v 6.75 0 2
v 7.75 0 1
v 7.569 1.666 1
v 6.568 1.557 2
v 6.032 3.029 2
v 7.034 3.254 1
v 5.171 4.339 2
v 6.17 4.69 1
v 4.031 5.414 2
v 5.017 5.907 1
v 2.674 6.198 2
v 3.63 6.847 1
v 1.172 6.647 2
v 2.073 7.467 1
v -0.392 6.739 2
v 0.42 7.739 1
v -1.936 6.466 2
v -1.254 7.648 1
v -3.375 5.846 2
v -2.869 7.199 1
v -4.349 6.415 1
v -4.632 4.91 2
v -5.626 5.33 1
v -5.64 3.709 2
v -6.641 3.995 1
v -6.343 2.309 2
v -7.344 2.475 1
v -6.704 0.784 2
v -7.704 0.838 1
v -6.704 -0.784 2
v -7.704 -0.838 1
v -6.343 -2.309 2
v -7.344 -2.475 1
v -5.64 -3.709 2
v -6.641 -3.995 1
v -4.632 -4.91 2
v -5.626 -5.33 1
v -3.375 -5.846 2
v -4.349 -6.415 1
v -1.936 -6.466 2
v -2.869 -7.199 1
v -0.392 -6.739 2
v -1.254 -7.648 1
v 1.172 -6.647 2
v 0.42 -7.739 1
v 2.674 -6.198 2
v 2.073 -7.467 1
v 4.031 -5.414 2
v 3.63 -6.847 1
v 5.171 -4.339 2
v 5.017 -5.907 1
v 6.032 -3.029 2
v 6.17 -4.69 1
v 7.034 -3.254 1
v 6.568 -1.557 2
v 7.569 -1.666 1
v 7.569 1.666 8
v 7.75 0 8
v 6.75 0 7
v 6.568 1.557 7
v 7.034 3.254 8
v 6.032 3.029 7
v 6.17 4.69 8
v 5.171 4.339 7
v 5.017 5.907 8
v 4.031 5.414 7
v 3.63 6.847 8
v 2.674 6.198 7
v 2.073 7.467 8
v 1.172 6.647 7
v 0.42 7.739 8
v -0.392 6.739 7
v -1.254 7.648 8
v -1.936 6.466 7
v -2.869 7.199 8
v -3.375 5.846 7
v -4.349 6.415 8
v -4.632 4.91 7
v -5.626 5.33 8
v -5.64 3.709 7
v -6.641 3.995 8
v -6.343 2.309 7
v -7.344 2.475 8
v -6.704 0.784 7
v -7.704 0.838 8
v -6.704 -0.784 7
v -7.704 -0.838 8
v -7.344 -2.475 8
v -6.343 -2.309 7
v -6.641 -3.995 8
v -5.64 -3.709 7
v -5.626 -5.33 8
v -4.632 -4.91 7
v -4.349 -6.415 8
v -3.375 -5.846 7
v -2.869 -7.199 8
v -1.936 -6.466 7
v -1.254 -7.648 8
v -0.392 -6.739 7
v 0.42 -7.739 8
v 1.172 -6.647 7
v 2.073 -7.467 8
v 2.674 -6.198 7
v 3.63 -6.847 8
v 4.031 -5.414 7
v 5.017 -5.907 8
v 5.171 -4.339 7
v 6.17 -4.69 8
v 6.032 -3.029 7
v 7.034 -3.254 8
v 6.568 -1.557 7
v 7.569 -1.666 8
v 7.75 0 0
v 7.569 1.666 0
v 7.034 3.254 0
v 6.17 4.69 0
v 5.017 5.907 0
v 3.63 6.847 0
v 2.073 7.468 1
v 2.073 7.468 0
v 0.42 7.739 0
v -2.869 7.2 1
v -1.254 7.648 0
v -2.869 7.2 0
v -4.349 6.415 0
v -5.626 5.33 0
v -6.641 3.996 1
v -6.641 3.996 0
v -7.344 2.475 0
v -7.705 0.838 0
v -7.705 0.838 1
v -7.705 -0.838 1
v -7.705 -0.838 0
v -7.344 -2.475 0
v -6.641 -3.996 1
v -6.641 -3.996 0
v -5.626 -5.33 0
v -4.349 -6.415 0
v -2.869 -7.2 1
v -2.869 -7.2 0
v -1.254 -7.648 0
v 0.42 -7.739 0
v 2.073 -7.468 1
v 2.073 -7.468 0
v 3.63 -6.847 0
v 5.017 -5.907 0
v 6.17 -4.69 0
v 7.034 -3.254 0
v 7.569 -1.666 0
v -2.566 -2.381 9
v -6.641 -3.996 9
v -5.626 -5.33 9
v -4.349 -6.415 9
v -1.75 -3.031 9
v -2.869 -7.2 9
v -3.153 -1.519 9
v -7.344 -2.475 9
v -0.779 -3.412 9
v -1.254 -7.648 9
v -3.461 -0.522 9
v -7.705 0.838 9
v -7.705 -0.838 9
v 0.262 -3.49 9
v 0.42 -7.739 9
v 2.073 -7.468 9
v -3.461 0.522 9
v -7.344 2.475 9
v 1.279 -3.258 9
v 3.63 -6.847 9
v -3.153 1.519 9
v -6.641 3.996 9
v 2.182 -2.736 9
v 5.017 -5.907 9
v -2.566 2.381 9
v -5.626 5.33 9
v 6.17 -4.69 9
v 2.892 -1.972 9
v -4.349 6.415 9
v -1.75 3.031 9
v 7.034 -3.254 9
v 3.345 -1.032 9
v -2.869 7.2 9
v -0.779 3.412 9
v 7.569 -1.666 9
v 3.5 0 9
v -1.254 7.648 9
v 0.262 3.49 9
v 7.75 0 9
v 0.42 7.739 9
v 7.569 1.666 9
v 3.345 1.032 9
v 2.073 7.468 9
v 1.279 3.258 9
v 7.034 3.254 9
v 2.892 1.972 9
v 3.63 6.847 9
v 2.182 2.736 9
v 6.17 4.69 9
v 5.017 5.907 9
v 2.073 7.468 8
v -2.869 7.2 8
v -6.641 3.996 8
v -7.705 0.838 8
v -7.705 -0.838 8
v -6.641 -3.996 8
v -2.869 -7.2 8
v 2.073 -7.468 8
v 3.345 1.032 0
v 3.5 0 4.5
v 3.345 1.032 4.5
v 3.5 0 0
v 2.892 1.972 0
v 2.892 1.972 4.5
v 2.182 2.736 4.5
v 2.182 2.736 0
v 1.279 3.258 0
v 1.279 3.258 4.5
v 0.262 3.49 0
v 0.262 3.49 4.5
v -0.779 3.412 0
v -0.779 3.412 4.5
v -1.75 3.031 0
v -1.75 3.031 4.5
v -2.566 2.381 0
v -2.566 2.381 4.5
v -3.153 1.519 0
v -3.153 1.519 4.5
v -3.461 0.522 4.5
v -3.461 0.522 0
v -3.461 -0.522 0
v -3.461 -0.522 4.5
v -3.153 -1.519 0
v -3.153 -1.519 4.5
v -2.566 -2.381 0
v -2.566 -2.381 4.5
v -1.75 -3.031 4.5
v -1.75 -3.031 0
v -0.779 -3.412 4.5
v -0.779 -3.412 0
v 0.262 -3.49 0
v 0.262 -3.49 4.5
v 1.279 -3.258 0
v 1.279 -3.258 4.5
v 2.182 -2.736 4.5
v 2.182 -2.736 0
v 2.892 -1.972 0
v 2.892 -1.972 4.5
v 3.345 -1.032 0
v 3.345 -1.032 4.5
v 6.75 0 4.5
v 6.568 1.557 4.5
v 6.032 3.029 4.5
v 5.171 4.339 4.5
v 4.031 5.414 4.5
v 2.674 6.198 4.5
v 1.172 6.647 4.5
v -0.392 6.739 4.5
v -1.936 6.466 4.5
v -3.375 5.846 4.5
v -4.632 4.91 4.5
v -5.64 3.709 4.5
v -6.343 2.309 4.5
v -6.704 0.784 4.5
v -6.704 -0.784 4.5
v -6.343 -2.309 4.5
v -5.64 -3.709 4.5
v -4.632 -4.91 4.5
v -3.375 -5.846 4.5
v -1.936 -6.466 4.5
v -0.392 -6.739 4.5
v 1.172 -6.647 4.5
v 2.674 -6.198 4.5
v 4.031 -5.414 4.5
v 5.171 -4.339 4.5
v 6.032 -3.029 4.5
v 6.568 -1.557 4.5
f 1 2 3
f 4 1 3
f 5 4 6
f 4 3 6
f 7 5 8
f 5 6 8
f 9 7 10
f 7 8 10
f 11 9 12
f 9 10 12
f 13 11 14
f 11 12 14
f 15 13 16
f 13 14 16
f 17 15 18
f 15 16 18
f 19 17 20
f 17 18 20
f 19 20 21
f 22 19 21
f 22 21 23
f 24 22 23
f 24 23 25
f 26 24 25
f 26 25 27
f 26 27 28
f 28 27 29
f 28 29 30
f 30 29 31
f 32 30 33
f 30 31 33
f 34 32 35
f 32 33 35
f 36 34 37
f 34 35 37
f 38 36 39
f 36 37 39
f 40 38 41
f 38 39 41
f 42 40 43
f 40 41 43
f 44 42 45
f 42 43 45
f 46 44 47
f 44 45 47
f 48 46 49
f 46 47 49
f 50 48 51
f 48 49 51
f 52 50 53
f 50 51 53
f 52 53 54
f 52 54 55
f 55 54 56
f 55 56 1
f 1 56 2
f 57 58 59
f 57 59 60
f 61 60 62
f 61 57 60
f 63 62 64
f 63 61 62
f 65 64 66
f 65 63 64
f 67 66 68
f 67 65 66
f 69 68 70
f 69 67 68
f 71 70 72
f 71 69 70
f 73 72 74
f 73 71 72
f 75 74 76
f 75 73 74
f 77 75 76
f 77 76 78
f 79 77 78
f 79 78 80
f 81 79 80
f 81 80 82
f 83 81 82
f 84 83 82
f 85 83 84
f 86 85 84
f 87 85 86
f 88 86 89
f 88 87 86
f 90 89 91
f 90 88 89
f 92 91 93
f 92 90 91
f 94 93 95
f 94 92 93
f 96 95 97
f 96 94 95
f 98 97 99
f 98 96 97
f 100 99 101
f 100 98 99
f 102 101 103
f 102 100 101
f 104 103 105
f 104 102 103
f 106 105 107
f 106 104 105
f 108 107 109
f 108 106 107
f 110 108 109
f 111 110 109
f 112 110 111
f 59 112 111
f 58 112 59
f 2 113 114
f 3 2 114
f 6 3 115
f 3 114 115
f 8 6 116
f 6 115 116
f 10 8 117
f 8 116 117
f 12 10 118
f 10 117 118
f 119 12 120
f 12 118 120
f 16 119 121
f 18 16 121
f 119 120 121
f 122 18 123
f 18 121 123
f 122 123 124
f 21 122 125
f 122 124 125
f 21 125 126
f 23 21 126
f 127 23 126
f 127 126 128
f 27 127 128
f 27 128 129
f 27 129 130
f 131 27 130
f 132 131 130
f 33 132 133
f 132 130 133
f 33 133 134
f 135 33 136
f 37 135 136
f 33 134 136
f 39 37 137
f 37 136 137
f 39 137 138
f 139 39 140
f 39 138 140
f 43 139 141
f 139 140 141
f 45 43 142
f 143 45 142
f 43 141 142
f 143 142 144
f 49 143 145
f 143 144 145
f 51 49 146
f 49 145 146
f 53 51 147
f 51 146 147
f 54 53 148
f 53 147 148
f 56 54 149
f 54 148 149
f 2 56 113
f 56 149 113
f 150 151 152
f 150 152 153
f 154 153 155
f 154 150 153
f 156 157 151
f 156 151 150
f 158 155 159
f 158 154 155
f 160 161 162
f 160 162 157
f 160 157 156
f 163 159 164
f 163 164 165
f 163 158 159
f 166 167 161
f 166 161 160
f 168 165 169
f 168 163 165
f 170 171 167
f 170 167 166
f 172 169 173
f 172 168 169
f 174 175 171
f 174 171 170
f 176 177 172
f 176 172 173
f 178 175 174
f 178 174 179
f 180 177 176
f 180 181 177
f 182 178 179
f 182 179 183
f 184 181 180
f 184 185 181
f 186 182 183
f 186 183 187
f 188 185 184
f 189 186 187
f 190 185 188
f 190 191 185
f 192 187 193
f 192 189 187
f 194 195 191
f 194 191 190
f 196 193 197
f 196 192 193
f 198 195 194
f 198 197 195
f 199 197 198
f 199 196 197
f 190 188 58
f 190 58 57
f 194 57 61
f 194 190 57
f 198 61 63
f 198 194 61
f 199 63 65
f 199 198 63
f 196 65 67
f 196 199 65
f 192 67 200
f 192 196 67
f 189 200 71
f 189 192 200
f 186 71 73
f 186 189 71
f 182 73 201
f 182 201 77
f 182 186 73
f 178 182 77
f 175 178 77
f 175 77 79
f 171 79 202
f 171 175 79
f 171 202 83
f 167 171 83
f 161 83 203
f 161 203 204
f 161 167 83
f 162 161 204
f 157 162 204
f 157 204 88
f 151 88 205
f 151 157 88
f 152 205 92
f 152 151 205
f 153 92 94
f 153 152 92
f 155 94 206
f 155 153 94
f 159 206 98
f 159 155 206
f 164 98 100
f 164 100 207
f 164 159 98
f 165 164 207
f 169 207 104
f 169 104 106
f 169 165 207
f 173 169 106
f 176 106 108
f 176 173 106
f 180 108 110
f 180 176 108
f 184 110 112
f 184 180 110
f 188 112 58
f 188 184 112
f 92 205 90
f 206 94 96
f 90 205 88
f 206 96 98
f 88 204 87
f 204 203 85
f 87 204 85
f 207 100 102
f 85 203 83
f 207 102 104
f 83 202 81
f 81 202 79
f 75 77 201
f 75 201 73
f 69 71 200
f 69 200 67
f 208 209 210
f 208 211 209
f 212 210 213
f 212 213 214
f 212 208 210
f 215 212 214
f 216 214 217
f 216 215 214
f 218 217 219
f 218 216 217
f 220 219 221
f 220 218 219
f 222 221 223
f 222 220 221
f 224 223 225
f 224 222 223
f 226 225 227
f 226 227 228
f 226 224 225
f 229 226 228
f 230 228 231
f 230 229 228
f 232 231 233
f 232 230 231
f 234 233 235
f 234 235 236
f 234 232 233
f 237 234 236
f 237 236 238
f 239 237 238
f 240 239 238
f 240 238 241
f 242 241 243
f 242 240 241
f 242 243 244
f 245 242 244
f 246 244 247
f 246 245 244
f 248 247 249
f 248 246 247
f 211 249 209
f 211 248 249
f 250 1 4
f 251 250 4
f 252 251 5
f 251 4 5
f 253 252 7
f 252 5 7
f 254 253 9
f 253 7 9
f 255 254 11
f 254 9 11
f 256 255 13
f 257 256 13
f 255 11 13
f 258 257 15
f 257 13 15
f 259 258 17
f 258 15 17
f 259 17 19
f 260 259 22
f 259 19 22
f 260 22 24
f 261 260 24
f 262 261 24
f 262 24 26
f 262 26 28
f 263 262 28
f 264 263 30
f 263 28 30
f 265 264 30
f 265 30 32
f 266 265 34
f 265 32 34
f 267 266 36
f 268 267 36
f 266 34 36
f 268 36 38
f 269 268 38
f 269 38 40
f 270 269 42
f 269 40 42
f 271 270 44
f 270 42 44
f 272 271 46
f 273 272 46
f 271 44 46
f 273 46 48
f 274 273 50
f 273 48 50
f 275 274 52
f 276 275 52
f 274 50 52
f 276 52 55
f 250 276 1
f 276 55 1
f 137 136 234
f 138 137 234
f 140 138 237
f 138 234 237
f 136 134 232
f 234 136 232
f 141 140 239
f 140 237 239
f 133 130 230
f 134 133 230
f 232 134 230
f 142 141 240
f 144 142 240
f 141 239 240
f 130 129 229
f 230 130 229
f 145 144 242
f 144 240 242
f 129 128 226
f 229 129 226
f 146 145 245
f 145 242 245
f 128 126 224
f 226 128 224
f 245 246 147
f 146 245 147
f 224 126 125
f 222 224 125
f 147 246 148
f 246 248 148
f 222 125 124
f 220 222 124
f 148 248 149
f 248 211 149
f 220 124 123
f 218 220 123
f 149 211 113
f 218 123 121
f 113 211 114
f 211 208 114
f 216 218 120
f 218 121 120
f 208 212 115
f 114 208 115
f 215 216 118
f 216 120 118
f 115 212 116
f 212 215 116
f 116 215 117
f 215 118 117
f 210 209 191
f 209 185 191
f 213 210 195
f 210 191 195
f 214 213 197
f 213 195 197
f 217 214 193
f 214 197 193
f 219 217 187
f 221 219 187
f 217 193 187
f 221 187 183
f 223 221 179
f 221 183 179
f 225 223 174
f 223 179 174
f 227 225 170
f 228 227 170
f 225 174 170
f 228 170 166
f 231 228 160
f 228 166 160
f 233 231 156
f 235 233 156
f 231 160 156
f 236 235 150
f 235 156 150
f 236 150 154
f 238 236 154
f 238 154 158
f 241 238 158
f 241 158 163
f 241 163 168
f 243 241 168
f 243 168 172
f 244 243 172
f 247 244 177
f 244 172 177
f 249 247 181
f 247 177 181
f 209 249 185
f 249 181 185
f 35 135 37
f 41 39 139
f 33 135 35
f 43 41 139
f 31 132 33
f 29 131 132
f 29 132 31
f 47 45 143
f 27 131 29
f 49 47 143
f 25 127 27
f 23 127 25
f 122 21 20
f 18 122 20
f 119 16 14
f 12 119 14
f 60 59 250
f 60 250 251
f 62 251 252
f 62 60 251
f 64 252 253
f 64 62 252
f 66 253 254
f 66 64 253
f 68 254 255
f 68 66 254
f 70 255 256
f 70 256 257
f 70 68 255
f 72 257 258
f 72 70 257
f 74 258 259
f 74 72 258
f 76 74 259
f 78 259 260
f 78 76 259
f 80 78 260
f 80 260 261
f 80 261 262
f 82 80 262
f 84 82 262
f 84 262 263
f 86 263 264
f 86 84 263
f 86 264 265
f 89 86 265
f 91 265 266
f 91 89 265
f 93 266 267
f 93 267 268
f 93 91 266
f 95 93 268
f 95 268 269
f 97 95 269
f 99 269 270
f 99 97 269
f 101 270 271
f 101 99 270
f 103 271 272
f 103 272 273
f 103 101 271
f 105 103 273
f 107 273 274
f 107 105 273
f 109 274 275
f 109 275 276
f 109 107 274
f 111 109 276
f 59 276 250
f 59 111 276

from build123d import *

# Parameters (mm, degrees)
SKETCH1_R           = 7.75
SKETCH1_R_2         = 3.5
BOSS_EXTRUDE1_DEPTH = 1
SKETCH2_R           = 6.75
SKETCH2_R_2         = 3.5
BOSS_EXTRUDE2_DEPTH = 3.5
CHAMFER1_SIZE       = 1


with BuildPart() as part:
    # Sketch1 → Boss-Extrude1 (new body)
    with BuildSketch(Plane.XY):
        Circle(SKETCH1_R)
        Circle(SKETCH1_R_2, mode=Mode.SUBTRACT)
    extrude(amount=BOSS_EXTRUDE1_DEPTH)

    # Sketch2 → Boss-Extrude2 (add)
    with BuildSketch(Plane.XY.offset(1)):
        Circle(SKETCH2_R)
        Circle(SKETCH2_R_2, mode=Mode.SUBTRACT)
    extrude(amount=BOSS_EXTRUDE2_DEPTH)

    # Chamfer1
    chamfer1_edges = [part.edges().sort_by_distance(p)[0] for p in [
        (-6.75, 0, 1),
    ]]
    chamfer(chamfer1_edges, length=CHAMFER1_SIZE - 0.0001)  # a hair under: the kernel refuses the full size

    # Mirror5: part across plane


with BuildPart() as part_1:
    add(part.part)
    add(part.part.mirror(Plane.XY.offset(4.5)))


solid = part_1.part
